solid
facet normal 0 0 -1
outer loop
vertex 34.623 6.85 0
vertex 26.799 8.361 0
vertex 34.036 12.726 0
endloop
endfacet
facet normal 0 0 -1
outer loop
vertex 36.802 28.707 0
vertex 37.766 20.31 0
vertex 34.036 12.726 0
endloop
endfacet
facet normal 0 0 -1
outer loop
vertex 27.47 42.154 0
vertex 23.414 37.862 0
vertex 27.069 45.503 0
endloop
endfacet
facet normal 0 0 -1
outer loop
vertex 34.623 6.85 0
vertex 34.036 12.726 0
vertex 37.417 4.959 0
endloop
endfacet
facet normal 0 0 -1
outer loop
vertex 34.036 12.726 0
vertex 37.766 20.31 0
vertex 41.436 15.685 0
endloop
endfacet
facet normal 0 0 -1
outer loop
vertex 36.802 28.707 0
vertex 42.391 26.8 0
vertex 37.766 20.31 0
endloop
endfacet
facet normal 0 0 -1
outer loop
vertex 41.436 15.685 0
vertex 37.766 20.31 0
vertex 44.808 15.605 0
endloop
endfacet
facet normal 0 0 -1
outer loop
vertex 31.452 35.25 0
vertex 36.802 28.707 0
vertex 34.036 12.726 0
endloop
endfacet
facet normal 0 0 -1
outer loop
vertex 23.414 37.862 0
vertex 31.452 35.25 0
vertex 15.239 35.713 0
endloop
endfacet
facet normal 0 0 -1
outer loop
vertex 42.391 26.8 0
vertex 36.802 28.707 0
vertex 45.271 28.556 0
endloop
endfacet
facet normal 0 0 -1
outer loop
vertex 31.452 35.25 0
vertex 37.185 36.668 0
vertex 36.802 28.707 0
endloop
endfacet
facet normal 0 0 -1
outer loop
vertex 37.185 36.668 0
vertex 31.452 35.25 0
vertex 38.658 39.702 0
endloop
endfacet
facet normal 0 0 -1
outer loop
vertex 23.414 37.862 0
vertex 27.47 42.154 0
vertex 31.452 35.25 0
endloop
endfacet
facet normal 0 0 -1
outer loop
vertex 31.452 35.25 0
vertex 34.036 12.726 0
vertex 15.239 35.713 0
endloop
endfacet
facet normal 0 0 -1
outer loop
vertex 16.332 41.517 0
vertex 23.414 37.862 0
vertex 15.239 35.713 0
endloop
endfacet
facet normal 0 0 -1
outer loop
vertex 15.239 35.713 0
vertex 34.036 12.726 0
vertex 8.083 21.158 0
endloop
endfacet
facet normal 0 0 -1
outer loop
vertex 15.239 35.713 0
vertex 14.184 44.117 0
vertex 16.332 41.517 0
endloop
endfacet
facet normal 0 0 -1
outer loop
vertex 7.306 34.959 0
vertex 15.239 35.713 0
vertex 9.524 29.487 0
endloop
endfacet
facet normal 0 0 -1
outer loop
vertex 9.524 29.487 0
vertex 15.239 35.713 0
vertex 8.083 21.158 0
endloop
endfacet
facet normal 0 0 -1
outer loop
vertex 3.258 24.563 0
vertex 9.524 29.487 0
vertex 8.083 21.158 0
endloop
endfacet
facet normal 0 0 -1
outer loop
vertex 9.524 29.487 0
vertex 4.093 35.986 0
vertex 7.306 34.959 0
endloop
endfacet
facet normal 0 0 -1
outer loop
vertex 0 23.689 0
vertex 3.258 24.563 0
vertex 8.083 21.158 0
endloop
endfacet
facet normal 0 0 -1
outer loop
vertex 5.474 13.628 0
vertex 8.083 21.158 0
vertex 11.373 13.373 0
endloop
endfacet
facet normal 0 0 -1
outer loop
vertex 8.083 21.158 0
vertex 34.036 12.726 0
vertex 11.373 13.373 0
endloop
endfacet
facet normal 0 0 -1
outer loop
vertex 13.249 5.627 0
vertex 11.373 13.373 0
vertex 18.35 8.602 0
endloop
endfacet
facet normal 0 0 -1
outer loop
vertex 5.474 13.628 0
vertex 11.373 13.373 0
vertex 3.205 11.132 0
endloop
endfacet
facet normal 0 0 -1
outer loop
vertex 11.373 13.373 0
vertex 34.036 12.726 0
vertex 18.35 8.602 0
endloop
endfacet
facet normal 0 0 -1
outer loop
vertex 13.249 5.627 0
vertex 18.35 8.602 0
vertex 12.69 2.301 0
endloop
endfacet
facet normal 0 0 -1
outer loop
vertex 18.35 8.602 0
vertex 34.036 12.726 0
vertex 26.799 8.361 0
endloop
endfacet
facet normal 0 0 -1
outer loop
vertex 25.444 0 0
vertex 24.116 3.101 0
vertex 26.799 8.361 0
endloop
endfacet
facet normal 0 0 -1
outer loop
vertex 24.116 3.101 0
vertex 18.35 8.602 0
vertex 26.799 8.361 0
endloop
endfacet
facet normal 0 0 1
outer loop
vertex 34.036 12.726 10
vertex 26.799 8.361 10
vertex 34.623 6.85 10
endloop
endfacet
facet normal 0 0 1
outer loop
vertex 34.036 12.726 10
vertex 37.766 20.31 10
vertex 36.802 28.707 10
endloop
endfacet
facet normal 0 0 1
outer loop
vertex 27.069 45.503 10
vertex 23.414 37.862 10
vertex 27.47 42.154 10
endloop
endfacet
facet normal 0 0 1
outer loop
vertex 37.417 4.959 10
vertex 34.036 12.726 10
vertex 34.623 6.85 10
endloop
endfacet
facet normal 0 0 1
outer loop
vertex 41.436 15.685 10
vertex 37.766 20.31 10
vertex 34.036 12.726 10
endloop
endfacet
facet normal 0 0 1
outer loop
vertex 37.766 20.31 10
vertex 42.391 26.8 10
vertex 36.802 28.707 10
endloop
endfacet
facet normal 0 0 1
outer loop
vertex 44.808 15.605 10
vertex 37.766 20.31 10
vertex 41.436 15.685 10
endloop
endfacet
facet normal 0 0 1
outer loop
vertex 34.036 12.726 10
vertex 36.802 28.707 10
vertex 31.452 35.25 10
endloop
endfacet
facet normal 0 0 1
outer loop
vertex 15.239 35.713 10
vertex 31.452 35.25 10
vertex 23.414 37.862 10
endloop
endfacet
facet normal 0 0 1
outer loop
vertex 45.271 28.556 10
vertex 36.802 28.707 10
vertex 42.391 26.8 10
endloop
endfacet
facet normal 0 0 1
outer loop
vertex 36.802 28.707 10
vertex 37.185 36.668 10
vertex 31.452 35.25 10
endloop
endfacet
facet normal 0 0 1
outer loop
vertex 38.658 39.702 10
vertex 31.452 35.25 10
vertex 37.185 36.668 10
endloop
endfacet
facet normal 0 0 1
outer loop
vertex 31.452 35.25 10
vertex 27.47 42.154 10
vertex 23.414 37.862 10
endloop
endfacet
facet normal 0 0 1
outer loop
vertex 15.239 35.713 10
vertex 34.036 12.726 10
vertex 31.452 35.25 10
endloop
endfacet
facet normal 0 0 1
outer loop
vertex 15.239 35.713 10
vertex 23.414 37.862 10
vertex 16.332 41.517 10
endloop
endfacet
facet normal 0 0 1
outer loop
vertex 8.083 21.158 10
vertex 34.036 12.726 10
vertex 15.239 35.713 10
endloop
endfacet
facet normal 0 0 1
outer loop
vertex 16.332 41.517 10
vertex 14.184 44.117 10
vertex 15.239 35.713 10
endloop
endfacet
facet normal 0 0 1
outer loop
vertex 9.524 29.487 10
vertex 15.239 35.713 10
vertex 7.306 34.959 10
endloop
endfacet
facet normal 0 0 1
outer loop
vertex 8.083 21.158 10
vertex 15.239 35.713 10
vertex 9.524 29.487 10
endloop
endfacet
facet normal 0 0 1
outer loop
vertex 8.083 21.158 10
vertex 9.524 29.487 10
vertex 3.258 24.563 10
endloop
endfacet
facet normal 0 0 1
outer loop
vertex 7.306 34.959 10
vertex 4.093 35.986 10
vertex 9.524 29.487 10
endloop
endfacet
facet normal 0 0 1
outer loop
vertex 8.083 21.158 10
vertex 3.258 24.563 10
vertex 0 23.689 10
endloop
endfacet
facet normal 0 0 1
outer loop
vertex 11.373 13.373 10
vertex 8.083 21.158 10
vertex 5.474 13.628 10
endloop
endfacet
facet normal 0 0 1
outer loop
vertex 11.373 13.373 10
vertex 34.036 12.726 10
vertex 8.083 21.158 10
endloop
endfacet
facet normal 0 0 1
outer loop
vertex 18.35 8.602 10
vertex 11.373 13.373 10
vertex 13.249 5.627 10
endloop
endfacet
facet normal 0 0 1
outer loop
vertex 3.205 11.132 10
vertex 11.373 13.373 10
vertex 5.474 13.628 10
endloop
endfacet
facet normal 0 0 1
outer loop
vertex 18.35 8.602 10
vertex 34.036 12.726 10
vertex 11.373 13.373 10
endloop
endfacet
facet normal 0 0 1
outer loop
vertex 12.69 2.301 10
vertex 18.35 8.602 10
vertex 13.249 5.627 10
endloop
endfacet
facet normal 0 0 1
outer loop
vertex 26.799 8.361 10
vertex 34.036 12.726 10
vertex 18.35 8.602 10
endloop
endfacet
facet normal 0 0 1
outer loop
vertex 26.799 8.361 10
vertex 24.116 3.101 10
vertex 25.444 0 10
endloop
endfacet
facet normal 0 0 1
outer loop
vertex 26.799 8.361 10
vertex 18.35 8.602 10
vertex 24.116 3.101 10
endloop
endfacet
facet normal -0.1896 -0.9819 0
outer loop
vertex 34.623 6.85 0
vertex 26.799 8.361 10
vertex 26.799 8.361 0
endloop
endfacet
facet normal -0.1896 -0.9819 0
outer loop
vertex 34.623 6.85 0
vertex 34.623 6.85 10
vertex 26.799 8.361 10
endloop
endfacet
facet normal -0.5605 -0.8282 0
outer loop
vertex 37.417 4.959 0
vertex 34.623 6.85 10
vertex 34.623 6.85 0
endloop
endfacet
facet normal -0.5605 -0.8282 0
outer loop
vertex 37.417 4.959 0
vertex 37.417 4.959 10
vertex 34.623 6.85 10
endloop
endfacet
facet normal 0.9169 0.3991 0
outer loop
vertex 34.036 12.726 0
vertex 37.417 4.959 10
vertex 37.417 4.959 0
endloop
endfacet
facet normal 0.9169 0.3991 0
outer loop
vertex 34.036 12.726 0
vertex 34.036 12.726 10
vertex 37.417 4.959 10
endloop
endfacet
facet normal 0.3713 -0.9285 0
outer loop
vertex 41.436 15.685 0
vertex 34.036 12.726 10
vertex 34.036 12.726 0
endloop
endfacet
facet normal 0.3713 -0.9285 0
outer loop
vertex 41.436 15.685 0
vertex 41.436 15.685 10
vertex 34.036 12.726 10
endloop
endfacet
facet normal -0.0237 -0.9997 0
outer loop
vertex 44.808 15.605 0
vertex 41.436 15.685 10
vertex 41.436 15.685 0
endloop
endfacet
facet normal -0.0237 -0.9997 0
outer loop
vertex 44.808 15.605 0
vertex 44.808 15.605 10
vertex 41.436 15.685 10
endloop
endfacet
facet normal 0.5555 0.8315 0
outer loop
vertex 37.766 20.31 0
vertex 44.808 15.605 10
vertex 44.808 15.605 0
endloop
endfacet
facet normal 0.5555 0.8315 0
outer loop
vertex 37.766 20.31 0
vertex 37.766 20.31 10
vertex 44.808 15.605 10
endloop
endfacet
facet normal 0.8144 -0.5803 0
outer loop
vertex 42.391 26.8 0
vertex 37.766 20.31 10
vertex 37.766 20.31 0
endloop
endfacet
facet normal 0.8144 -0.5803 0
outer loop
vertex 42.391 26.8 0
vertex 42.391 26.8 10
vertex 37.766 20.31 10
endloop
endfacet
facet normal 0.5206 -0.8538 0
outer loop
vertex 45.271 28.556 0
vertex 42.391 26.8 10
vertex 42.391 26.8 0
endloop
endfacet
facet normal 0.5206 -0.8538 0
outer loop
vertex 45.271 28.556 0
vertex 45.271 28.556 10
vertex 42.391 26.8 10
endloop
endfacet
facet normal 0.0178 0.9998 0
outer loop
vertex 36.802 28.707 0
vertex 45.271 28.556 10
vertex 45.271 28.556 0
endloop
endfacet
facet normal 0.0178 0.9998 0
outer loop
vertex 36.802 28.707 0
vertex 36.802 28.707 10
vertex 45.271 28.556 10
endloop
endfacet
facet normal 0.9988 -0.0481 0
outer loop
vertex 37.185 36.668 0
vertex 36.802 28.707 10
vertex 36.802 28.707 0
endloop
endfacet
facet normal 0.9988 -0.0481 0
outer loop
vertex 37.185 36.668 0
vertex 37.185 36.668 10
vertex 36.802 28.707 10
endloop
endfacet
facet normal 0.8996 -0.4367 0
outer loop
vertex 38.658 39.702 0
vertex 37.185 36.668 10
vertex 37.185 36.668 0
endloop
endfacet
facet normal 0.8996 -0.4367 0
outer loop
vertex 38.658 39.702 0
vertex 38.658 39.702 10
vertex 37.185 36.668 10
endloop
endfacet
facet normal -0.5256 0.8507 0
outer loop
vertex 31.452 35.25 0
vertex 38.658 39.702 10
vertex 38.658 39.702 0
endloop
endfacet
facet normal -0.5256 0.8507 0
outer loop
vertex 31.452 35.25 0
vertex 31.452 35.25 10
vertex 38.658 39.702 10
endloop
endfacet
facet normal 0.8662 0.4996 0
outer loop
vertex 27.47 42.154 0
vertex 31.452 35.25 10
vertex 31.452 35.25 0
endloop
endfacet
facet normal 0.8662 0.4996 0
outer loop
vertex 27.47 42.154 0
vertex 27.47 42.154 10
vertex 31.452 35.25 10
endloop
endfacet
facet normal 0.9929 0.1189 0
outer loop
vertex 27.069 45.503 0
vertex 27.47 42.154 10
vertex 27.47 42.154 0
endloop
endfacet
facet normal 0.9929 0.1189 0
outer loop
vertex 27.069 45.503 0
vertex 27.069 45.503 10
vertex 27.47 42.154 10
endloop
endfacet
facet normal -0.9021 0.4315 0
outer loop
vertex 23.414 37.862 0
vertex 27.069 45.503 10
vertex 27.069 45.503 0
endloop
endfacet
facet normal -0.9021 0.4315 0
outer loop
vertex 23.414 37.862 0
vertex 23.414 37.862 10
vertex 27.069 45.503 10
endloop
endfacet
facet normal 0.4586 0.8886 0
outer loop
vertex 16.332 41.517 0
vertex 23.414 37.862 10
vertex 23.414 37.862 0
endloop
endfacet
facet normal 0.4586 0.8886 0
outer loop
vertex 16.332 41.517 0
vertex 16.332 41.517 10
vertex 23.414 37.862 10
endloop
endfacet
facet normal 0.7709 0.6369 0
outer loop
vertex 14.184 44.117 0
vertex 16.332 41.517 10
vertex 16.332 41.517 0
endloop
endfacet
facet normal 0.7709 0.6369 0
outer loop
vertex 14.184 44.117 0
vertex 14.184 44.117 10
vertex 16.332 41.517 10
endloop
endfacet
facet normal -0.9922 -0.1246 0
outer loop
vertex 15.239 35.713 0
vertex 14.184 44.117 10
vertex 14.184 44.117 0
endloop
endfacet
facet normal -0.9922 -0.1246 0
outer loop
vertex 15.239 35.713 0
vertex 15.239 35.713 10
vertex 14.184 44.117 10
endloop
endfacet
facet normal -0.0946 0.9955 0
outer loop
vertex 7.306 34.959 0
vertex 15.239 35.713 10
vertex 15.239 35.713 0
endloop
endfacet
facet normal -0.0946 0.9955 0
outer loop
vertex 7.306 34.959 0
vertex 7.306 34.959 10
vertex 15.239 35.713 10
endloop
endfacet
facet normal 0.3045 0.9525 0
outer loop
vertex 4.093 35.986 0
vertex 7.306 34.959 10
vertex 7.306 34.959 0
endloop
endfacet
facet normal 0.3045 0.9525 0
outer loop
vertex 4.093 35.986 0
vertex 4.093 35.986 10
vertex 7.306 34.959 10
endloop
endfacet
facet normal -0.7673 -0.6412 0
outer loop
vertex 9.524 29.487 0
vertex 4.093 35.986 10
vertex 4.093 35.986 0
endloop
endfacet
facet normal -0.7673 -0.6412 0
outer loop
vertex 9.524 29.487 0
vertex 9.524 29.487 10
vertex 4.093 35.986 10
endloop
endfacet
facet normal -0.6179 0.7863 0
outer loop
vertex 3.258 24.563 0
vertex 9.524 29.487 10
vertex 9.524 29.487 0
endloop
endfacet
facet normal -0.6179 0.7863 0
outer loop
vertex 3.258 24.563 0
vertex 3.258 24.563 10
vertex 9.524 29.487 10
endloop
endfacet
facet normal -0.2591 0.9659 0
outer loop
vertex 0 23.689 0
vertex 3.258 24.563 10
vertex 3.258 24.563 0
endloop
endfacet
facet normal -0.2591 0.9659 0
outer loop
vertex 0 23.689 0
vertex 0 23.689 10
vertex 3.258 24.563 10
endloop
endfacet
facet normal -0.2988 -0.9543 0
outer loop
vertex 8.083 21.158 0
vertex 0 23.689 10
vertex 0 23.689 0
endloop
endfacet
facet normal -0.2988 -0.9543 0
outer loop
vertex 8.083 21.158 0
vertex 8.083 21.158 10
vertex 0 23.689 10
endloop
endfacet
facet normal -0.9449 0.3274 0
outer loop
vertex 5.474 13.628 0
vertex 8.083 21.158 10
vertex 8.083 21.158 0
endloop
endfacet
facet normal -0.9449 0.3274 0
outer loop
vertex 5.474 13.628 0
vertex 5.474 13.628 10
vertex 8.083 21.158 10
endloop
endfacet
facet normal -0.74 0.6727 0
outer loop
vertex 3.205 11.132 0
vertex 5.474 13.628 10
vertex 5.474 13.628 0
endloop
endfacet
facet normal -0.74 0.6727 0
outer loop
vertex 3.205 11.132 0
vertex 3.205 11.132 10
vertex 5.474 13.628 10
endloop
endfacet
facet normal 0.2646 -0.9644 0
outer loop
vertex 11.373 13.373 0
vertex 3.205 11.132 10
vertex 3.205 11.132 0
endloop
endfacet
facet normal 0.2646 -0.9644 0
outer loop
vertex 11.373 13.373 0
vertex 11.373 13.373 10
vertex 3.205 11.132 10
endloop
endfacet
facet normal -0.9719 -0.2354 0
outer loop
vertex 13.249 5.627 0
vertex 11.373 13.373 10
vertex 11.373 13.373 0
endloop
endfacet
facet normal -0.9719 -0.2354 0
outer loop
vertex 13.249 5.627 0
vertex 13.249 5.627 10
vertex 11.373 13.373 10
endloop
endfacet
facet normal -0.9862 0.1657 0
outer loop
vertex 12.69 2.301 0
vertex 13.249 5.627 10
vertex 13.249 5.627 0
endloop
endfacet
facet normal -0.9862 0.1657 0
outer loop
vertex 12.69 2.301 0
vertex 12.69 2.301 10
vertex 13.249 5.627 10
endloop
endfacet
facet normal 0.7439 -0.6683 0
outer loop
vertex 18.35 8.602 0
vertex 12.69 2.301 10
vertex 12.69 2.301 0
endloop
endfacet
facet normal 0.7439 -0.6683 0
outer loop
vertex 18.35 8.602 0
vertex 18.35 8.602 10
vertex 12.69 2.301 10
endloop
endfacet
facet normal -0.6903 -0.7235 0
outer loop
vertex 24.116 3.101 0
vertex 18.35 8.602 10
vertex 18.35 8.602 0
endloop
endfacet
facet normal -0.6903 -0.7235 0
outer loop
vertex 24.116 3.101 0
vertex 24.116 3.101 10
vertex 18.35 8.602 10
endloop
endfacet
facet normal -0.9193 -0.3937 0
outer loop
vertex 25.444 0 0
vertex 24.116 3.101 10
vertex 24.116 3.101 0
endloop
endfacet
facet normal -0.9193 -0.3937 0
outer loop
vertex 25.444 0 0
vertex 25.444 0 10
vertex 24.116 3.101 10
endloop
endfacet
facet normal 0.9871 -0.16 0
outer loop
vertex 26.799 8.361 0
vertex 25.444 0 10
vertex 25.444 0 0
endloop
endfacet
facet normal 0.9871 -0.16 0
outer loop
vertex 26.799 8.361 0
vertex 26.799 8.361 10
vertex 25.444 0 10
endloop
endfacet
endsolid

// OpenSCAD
$fn = 32;

// ----------------------------------------------------------------------
// Fan rotor section: 11 blades, 15 mm hub radius, 8 mm blades
// ----------------------------------------------------------------------

// --- parameters (mm) ---
profile_height = 10;      // extrusion height
profile_points = 33;      // points of the closed outline

profile = [[37.766, 20.31], [42.391, 26.8], [45.271, 28.556], [36.802, 28.707], [37.185, 36.668], [38.658, 39.702], [31.452, 35.25], [27.47, 42.154], [27.069, 45.503], [23.414, 37.862], [16.332, 41.517], [14.184, 44.117], [15.239, 35.713], [7.306, 34.959], [4.093, 35.986], [9.524, 29.487], [3.258, 24.563], [0, 23.689], [8.083, 21.158], [5.474, 13.628], [3.205, 11.132], [11.373, 13.373], [13.249, 5.627], [12.69, 2.301], [18.35, 8.602], [24.116, 3.101], [25.444, 0], [26.799, 8.361], [34.623, 6.85], [37.417, 4.959], [34.036, 12.726], [41.436, 15.685], [44.808, 15.605]];  // single closed polygon, 33 points, counter clockwise

// --- the one profile operation ---
linear_extrude(height = profile_height) polygon(points = profile);
